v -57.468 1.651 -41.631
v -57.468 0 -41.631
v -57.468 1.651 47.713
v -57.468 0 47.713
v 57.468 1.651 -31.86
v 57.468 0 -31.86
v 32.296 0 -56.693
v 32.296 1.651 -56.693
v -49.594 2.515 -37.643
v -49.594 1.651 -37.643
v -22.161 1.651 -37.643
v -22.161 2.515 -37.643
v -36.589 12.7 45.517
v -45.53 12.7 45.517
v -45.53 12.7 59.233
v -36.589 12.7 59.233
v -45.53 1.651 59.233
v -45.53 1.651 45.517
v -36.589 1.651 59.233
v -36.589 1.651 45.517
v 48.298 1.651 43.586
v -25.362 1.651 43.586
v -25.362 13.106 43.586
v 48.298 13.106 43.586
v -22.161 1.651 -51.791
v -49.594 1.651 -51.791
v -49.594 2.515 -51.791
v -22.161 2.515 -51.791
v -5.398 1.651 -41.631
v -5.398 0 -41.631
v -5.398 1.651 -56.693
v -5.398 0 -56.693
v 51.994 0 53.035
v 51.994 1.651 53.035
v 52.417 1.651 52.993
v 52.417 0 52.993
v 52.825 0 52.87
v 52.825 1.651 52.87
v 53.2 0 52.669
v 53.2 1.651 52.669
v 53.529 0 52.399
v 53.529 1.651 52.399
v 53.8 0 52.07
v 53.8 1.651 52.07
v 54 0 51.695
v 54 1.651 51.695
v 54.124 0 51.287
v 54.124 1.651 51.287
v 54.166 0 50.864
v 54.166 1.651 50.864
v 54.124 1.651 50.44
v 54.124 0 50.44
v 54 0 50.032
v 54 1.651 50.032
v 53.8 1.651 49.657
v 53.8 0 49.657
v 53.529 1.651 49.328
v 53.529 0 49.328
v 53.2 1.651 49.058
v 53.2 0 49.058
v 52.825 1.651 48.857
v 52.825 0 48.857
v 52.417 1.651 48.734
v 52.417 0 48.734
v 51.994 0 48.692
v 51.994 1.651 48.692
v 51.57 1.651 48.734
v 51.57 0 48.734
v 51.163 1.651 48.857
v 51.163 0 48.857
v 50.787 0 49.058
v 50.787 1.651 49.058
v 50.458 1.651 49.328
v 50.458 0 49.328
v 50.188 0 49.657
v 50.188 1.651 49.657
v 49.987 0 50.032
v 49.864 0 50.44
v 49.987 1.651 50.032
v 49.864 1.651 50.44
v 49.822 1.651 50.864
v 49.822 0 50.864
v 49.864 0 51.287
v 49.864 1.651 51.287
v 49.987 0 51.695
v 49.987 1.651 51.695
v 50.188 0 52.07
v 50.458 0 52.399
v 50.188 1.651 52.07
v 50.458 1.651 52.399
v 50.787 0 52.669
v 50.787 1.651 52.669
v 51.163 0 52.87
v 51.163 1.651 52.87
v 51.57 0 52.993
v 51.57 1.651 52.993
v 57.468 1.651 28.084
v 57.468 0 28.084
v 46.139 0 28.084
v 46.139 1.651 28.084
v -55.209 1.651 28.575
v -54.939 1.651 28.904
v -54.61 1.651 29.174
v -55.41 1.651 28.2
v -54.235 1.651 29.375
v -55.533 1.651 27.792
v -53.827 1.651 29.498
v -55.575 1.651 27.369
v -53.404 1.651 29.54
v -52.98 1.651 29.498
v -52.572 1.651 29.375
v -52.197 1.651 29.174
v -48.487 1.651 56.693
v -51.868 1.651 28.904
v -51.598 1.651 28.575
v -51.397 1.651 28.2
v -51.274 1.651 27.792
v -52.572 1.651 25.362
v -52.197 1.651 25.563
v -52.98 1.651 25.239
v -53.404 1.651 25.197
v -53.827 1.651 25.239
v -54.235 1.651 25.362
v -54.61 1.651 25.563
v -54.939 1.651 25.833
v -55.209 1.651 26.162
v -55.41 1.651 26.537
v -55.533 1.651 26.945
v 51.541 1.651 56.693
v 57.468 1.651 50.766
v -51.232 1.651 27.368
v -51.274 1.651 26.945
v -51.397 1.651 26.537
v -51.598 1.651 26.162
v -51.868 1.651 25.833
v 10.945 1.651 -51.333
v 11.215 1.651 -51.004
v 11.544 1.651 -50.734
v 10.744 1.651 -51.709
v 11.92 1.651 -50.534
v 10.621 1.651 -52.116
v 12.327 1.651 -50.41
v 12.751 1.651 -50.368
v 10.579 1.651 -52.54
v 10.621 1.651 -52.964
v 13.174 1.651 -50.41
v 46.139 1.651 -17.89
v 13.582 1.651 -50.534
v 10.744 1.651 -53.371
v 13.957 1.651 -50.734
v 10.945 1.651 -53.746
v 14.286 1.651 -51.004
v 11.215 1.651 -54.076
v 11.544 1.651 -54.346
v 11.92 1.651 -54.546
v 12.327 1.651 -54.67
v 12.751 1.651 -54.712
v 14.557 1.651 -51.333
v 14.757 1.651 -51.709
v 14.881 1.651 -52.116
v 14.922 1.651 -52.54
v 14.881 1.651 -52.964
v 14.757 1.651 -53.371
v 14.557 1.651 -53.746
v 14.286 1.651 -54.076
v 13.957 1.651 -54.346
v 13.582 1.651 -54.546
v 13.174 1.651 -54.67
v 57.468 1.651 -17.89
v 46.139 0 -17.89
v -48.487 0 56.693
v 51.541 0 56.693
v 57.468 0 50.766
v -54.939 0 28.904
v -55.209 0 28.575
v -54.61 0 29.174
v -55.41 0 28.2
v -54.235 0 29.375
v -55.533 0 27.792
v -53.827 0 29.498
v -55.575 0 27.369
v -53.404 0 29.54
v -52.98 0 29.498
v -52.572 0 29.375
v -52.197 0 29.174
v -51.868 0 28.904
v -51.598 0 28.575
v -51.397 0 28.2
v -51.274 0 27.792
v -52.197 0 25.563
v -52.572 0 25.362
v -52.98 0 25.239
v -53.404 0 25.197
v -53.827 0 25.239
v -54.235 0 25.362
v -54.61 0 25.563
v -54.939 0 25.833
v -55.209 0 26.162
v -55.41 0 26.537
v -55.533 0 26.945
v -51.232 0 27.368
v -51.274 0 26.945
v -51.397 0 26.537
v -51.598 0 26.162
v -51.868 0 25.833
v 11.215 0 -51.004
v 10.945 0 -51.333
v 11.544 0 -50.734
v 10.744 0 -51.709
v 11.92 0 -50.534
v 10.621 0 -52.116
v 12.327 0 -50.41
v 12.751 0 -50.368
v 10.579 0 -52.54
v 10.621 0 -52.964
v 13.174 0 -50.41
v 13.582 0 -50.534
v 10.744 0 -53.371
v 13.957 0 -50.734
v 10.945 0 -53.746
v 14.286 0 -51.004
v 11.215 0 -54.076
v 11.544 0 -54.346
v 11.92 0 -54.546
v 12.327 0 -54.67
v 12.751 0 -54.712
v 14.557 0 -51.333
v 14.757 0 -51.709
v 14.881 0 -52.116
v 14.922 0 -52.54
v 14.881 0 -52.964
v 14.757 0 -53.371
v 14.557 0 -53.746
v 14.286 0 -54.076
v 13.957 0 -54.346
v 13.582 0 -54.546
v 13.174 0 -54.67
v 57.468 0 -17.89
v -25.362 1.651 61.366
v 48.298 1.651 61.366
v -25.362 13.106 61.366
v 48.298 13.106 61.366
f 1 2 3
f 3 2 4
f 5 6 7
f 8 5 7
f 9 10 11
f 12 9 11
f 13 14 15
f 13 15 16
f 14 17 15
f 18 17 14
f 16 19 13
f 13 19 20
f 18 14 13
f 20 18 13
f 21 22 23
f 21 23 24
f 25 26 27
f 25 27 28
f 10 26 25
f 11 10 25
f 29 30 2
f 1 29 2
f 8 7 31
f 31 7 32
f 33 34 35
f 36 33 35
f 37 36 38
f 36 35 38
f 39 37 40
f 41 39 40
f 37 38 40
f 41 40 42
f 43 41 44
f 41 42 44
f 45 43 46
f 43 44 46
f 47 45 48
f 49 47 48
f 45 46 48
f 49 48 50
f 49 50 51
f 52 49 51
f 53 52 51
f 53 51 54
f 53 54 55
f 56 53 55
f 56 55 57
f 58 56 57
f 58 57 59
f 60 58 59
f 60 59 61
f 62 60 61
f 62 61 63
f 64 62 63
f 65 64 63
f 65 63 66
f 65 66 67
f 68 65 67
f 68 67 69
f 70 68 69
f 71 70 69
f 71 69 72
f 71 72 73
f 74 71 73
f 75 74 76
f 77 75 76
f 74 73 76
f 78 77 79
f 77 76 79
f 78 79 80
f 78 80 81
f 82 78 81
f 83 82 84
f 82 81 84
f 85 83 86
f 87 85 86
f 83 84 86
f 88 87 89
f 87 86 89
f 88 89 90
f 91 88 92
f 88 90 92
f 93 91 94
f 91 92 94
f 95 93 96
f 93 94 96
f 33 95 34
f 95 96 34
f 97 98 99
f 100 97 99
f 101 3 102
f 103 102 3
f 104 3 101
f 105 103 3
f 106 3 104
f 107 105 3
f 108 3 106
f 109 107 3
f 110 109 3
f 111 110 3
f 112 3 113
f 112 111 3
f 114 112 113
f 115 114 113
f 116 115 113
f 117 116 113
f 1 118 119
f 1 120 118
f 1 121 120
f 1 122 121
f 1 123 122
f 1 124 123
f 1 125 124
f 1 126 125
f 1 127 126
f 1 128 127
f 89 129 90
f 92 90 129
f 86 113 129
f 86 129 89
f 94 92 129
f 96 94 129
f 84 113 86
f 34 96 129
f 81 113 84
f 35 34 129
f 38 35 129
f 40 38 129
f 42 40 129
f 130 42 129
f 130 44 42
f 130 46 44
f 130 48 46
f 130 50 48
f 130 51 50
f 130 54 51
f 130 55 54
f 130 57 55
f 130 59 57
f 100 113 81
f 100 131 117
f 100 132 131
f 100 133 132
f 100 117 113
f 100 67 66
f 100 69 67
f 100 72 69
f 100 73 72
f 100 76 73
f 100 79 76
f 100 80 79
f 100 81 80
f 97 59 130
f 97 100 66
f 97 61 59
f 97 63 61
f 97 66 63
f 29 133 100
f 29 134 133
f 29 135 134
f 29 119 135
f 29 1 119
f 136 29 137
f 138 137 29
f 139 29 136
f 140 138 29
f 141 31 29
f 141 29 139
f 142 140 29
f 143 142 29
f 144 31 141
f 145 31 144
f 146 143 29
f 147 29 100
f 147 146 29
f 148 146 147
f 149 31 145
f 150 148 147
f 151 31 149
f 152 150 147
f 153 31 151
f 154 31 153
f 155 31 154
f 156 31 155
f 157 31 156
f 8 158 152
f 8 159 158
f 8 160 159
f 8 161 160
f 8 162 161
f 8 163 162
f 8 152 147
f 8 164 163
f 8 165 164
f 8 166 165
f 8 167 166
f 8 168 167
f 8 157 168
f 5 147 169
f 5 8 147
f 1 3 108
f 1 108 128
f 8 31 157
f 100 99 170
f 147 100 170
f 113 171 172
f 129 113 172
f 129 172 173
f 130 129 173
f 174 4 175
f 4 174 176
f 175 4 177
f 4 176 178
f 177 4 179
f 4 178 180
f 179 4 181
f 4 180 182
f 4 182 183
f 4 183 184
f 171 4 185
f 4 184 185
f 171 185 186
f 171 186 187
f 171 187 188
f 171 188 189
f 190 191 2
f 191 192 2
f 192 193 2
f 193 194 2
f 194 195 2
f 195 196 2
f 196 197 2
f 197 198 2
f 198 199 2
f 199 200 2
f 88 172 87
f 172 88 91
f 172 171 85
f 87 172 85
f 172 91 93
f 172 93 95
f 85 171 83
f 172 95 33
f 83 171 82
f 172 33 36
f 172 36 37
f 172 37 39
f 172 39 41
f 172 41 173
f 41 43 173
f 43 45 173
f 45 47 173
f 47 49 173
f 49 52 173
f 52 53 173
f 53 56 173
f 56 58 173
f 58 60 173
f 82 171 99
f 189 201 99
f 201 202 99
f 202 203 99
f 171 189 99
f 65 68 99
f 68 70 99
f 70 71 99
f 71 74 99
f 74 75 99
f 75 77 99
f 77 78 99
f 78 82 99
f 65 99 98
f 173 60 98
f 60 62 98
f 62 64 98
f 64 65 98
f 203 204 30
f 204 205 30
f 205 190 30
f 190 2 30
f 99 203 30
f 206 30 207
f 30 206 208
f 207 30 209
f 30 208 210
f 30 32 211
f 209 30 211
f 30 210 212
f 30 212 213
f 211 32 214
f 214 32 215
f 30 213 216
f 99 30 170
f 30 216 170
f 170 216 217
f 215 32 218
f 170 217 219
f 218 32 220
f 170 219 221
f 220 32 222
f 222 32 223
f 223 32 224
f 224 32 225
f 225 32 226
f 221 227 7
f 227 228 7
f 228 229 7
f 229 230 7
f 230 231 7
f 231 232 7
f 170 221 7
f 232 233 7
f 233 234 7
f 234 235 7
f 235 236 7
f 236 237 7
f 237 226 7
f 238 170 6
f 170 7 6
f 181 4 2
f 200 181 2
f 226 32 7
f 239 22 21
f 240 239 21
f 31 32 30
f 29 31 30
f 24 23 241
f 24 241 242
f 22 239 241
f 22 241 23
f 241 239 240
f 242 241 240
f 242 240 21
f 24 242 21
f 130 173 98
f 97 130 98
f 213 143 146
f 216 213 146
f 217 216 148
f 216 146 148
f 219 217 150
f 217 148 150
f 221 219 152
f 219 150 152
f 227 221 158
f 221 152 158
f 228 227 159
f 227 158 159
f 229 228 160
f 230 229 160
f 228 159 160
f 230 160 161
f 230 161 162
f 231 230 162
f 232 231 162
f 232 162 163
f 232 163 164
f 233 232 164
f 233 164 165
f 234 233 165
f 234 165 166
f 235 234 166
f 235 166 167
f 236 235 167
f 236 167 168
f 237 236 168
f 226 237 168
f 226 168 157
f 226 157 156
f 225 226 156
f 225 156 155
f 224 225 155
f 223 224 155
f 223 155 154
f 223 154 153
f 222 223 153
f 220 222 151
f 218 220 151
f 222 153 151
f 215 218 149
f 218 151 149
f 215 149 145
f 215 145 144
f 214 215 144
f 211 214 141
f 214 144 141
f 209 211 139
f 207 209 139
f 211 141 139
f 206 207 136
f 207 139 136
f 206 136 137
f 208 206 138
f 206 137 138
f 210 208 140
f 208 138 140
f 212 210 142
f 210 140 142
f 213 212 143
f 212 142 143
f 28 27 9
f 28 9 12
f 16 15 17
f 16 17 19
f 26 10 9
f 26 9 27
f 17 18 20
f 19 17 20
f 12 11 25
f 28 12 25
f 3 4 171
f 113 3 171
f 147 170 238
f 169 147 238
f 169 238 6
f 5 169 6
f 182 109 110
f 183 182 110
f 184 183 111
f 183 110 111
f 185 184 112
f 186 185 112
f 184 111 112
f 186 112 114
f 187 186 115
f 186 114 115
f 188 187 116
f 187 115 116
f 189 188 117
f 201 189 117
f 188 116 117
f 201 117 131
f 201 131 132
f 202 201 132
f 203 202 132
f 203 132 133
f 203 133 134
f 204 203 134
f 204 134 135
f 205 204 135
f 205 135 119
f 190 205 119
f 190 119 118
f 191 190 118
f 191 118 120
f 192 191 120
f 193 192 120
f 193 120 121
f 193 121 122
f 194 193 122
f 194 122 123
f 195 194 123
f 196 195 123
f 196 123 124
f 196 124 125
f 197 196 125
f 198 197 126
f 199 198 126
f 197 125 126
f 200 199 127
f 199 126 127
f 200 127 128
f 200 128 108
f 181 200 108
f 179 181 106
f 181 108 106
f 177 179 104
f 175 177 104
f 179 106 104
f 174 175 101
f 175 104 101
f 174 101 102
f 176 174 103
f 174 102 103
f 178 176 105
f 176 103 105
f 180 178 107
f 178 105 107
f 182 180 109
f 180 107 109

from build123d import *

# Parameters (mm, degrees)
PCB_DEPTH        = 1.651
SKETCH2_R        = 2.1717
MOUNTHOLES_DEPTH = 81.742262348
SKETCH3_W        = 73.66
SKETCH3_H        = 17.78
RJ45_DEPTH       = 11.4554
SKETCH4_W        = 27.432
SKETCH4_H        = 14.1478
ANT_DEPTH        = 0.8636
SKETCH6_W        = 8.9408
SKETCH6_H        = 13.716
POWER_DEPTH      = 11.049


with BuildPart() as part:
    # Sketch1 → PCB (new body)
    with BuildSketch(Plane(origin=(0, 0, 0), x_dir=(1, 0, 0), z_dir=(0, 1, 0))):
        Polygon((-57.4675, 41.6306), (-57.4675, -47.712543879), (-48.487243879, -56.6928), (51.54053096, -56.6928), (57.4675, -50.76583096), (57.4675, -28.08363096), (46.1391, -28.08363096), (46.1391, 17.89036904), (57.4675, 17.89036904), (57.4675, 31.86036904), (32.2961, 56.6928), (-5.3975, 56.6928), (-5.3975, 41.6306), align=None)
    extrude(amount=PCB_DEPTH)

    # Sketch2 → MountHoles (cut, through all)
    with BuildSketch(Plane(origin=(0, 1.651, 0), x_dir=(1, 0, 0), z_dir=(0, 1, 0))):
        with Locations(Location((-53.4035, -27.3685, 0), (0, 0, 270))):
            Circle(SKETCH2_R)
        with Locations(Location((12.7508, 52.5399, 0), (0, 0, 270))):
            Circle(SKETCH2_R)
        with Locations(Location((51.9938, -50.8635, 0), (0, 0, 270))):
            Circle(SKETCH2_R)
    extrude(amount=-MOUNTHOLES_DEPTH, mode=Mode.SUBTRACT)


with BuildPart() as body_2:
    # Sketch3 → RJ45 (new body)
    with BuildSketch(Plane(origin=(0, 1.651, 0), x_dir=(1, 0, 0), z_dir=(0, 1, 0))):
        with Locations((11.4681, -52.4764)):
            Rectangle(SKETCH3_W, SKETCH3_H)
    extrude(amount=RJ45_DEPTH)


with BuildPart() as body_3:
    # Sketch4 → Ant (new body)
    with BuildSketch(Plane(origin=(0, 1.651, 0), x_dir=(1, 0, 0), z_dir=(0, 1, 0))):
        with Locations((-35.8775, 44.7167)):
            Rectangle(SKETCH4_W, SKETCH4_H)
    extrude(amount=ANT_DEPTH)


with BuildPart() as body_4:
    # Sketch6 → Power (new body)
    with BuildSketch(Plane(origin=(0, 1.651, 0), x_dir=(1, 0, 0), z_dir=(0, 1, 0))):
        with Locations((-41.0591, -52.3748)):
            Rectangle(SKETCH6_W, SKETCH6_H)
    extrude(amount=POWER_DEPTH)


solid = Compound([part.part, body_2.part, body_3.part, body_4.part])
